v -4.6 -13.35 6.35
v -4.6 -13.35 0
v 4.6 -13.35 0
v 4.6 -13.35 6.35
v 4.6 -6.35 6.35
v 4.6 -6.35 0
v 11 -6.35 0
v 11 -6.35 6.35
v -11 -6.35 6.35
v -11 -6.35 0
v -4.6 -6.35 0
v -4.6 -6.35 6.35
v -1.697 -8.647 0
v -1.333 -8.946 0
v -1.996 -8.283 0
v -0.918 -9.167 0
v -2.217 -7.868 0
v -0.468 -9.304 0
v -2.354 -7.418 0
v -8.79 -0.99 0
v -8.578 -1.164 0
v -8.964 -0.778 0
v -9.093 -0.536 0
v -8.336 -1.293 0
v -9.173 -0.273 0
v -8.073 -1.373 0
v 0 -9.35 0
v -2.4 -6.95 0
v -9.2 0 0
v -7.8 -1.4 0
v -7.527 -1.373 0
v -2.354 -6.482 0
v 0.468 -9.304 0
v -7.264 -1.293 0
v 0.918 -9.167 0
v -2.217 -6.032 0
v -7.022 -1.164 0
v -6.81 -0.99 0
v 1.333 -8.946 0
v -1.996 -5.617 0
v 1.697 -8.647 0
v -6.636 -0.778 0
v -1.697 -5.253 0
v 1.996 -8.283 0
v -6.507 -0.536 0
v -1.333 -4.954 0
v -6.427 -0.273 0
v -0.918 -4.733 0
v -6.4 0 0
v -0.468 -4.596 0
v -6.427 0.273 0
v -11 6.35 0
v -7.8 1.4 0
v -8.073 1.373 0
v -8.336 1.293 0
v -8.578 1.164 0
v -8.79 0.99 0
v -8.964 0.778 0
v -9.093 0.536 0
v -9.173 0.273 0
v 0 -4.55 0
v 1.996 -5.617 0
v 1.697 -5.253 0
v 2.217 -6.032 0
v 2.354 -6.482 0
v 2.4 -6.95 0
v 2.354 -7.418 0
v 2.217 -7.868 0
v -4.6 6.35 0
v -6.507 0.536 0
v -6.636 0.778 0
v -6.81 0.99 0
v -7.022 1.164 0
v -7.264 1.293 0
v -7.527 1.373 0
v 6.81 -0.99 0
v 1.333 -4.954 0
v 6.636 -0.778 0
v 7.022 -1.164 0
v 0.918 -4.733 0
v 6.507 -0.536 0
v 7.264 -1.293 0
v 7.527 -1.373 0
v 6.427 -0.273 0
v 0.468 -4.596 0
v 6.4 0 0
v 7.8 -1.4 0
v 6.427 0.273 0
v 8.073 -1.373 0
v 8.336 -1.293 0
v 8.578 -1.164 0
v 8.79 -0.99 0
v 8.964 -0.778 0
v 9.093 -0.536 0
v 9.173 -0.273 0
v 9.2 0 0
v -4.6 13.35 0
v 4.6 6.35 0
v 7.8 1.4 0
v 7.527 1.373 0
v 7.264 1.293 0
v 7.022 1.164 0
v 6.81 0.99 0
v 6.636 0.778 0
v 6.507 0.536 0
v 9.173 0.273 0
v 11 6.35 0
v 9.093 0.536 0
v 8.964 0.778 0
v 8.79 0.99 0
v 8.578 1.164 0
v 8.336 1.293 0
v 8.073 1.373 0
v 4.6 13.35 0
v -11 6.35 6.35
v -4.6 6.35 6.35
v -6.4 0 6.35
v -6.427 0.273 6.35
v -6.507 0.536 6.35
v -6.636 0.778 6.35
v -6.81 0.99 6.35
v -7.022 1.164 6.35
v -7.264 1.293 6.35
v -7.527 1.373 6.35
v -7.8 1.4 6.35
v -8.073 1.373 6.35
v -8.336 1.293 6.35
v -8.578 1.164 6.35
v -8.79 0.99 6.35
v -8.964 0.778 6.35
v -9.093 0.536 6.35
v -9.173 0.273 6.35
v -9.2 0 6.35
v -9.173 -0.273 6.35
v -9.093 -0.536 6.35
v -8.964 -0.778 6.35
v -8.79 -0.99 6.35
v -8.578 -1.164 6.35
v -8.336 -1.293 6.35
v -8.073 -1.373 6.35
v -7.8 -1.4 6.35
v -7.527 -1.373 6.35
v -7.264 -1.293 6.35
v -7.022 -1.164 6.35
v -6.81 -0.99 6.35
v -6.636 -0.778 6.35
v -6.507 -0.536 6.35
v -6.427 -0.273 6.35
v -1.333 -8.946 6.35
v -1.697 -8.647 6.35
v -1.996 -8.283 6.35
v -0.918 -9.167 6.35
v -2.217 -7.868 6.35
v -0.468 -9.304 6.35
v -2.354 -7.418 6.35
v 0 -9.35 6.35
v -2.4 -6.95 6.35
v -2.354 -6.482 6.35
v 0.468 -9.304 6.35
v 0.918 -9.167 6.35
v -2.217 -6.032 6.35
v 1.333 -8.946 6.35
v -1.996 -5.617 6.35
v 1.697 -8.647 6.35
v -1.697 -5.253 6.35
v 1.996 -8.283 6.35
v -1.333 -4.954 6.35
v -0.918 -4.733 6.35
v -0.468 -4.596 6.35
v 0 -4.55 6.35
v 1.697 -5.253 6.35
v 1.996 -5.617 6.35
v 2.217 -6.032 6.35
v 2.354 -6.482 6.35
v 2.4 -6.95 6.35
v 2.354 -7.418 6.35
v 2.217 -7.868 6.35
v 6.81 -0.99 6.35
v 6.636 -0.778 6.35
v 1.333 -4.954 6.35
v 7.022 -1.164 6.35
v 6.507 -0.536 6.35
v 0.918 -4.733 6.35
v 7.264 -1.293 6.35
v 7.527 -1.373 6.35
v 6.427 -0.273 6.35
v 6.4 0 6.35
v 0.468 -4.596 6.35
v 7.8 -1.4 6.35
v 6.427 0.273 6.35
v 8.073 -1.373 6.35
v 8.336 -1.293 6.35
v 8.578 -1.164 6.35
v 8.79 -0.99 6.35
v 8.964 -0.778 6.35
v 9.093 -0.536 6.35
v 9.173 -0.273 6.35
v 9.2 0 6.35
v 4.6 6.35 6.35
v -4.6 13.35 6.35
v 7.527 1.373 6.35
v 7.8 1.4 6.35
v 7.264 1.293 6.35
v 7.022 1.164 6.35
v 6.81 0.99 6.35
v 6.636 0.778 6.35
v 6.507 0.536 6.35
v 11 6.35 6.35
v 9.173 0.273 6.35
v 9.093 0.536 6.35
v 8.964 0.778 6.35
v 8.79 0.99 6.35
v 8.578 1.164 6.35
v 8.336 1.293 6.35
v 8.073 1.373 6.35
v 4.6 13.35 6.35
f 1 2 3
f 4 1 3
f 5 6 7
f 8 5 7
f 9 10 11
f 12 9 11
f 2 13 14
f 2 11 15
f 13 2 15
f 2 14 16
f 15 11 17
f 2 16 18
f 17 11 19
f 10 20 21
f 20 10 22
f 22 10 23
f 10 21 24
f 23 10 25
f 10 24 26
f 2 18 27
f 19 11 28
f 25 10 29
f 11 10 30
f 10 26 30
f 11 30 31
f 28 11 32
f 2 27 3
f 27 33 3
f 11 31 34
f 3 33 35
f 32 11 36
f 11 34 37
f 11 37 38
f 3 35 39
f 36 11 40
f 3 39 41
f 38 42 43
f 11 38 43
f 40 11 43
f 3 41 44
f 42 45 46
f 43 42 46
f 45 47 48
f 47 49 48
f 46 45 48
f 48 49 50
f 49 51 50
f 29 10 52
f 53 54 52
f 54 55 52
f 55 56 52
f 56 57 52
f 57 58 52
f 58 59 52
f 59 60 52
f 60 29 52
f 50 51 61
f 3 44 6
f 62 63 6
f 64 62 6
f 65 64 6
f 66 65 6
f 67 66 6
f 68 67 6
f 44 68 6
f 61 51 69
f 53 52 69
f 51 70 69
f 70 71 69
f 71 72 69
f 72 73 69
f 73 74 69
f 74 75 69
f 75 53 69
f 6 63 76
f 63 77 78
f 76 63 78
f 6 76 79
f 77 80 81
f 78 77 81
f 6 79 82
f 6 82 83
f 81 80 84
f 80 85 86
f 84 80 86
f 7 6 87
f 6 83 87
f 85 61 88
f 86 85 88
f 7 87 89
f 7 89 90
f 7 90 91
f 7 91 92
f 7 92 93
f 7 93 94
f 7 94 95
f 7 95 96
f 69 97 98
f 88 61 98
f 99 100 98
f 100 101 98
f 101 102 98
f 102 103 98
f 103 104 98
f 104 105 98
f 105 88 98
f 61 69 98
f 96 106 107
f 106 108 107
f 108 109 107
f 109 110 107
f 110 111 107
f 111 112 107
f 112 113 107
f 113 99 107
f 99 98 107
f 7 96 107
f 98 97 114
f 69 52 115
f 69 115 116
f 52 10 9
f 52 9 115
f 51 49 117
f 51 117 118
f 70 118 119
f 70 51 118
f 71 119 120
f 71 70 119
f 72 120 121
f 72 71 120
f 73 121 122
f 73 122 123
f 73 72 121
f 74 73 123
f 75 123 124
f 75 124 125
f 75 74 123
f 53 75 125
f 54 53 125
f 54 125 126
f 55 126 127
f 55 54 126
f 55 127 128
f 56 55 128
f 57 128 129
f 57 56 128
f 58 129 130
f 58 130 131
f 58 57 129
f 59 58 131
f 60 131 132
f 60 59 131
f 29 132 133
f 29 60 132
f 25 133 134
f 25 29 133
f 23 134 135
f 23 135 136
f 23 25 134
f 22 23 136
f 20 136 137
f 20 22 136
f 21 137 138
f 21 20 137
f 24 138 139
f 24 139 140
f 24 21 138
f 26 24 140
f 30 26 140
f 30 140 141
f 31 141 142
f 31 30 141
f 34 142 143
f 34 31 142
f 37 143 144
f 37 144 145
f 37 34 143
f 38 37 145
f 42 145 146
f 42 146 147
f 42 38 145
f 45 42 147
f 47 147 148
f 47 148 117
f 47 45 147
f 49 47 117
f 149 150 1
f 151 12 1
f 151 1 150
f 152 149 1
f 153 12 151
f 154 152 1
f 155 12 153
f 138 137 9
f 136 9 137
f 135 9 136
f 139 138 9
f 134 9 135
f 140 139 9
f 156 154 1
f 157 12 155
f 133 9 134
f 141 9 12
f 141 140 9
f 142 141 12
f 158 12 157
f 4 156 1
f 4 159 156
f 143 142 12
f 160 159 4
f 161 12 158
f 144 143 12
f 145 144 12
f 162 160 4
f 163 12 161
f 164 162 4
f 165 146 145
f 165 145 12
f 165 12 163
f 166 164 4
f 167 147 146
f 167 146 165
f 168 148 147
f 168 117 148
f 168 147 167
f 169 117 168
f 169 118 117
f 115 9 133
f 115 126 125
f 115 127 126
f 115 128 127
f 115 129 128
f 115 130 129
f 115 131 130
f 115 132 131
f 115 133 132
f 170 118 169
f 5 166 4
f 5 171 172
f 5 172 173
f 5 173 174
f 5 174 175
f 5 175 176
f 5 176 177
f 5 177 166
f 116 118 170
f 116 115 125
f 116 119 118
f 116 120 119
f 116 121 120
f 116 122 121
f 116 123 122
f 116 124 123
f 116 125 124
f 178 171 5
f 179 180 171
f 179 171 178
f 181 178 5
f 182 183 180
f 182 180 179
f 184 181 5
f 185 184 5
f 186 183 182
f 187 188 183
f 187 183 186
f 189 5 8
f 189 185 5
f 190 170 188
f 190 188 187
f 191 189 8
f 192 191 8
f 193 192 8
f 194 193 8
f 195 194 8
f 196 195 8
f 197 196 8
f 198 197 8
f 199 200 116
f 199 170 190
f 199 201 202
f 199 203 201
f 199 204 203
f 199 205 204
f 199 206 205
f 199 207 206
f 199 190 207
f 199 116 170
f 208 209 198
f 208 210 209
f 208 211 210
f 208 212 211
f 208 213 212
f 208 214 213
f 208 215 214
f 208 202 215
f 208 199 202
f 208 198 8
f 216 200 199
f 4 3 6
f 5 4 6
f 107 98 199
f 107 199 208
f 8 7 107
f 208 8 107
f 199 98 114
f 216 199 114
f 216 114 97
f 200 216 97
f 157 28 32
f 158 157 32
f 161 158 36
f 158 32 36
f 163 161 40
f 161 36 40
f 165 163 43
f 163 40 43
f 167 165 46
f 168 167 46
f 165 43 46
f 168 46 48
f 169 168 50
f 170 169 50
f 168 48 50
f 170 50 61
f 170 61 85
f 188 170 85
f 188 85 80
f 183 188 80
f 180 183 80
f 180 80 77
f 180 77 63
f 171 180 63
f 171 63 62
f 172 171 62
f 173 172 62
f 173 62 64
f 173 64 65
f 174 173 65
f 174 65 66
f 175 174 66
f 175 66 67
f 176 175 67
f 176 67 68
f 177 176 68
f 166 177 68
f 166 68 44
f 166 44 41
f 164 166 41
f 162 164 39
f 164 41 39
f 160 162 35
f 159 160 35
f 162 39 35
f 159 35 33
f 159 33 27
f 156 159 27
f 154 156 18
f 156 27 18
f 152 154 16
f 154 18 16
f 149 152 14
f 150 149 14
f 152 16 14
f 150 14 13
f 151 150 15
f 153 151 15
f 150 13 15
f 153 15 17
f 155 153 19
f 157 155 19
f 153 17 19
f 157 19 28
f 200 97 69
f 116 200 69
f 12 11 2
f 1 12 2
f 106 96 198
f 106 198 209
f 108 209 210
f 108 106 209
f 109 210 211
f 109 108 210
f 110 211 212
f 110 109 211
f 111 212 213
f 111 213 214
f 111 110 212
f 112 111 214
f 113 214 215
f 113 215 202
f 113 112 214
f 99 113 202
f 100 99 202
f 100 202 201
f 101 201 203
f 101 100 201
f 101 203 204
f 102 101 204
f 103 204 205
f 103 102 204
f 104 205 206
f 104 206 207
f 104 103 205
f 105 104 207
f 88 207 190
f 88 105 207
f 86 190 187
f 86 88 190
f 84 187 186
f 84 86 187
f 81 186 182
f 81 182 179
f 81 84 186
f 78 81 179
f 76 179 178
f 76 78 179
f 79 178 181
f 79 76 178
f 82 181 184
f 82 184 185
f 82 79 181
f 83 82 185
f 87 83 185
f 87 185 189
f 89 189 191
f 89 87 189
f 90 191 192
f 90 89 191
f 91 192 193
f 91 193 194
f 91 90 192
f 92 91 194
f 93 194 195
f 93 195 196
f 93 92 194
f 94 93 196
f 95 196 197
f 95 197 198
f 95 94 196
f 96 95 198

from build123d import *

# Parameters (mm, degrees)
SKETCH1_W           = 6.4
SKETCH1_H           = 12.7
SKETCH1_R           = 1.4
BOSS_EXTRUDE1_DEPTH = 6.35
SKETCH2_R           = 2.4
CUT_EXTRUDE1_DEPTH  = 19.426746864


with BuildPart() as part:
    # Sketch1 → Boss-Extrude1 (new body)
    # profile 1 of 5: a face of its own
    with BuildSketch(Plane.XY):
        Polygon((-4.6, 13.35), (-4.6, 6.35), (-4.6, -6.35), (-4.6, -13.35), (4.6, -13.35), (4.6, -6.35), (4.6, 6.35), (4.6, 13.35), align=None)
    # profile 2 of 5: a face of its own
    with BuildSketch(Plane.XY):
        Polygon((-4.6, 13.35), (-4.6, 6.35), (-4.6, -6.35), (-4.6, -13.35), (4.6, -13.35), (4.6, -6.35), (4.6, 6.35), (4.6, 13.35), align=None)
    # profile 3 of 5: a face of its own
    with BuildSketch(Plane.XY):
        Polygon((-4.6, 13.35), (-4.6, 6.35), (-4.6, -6.35), (-4.6, -13.35), (4.6, -13.35), (4.6, -6.35), (4.6, 6.35), (4.6, 13.35), align=None)
    # profile 4 of 5: a face of its own
    with BuildSketch(Plane.XY):
        with Locations((7.8, 0)):
            Rectangle(SKETCH1_W, SKETCH1_H)
        with Locations((7.8, 0)):
            Circle(SKETCH1_R, mode=Mode.SUBTRACT)
    # profile 5 of 5: a face of its own
    with BuildSketch(Plane.XY):
        with Locations((-7.8, 0)):
            Rectangle(SKETCH1_W, SKETCH1_H)
        with Locations((-7.8, 0)):
            Circle(SKETCH1_R, mode=Mode.SUBTRACT)
    extrude(amount=BOSS_EXTRUDE1_DEPTH)

    # Sketch2 → Cut-Extrude1 (cut, through all)
    with BuildSketch(Plane(origin=(0, 0, 0), x_dir=(-1, 0, 0), z_dir=(0, 0, -1))):
        with Locations((0, -6.95)):
            Circle(SKETCH2_R)
    extrude(amount=-CUT_EXTRUDE1_DEPTH, mode=Mode.SUBTRACT)


solid = part.part
